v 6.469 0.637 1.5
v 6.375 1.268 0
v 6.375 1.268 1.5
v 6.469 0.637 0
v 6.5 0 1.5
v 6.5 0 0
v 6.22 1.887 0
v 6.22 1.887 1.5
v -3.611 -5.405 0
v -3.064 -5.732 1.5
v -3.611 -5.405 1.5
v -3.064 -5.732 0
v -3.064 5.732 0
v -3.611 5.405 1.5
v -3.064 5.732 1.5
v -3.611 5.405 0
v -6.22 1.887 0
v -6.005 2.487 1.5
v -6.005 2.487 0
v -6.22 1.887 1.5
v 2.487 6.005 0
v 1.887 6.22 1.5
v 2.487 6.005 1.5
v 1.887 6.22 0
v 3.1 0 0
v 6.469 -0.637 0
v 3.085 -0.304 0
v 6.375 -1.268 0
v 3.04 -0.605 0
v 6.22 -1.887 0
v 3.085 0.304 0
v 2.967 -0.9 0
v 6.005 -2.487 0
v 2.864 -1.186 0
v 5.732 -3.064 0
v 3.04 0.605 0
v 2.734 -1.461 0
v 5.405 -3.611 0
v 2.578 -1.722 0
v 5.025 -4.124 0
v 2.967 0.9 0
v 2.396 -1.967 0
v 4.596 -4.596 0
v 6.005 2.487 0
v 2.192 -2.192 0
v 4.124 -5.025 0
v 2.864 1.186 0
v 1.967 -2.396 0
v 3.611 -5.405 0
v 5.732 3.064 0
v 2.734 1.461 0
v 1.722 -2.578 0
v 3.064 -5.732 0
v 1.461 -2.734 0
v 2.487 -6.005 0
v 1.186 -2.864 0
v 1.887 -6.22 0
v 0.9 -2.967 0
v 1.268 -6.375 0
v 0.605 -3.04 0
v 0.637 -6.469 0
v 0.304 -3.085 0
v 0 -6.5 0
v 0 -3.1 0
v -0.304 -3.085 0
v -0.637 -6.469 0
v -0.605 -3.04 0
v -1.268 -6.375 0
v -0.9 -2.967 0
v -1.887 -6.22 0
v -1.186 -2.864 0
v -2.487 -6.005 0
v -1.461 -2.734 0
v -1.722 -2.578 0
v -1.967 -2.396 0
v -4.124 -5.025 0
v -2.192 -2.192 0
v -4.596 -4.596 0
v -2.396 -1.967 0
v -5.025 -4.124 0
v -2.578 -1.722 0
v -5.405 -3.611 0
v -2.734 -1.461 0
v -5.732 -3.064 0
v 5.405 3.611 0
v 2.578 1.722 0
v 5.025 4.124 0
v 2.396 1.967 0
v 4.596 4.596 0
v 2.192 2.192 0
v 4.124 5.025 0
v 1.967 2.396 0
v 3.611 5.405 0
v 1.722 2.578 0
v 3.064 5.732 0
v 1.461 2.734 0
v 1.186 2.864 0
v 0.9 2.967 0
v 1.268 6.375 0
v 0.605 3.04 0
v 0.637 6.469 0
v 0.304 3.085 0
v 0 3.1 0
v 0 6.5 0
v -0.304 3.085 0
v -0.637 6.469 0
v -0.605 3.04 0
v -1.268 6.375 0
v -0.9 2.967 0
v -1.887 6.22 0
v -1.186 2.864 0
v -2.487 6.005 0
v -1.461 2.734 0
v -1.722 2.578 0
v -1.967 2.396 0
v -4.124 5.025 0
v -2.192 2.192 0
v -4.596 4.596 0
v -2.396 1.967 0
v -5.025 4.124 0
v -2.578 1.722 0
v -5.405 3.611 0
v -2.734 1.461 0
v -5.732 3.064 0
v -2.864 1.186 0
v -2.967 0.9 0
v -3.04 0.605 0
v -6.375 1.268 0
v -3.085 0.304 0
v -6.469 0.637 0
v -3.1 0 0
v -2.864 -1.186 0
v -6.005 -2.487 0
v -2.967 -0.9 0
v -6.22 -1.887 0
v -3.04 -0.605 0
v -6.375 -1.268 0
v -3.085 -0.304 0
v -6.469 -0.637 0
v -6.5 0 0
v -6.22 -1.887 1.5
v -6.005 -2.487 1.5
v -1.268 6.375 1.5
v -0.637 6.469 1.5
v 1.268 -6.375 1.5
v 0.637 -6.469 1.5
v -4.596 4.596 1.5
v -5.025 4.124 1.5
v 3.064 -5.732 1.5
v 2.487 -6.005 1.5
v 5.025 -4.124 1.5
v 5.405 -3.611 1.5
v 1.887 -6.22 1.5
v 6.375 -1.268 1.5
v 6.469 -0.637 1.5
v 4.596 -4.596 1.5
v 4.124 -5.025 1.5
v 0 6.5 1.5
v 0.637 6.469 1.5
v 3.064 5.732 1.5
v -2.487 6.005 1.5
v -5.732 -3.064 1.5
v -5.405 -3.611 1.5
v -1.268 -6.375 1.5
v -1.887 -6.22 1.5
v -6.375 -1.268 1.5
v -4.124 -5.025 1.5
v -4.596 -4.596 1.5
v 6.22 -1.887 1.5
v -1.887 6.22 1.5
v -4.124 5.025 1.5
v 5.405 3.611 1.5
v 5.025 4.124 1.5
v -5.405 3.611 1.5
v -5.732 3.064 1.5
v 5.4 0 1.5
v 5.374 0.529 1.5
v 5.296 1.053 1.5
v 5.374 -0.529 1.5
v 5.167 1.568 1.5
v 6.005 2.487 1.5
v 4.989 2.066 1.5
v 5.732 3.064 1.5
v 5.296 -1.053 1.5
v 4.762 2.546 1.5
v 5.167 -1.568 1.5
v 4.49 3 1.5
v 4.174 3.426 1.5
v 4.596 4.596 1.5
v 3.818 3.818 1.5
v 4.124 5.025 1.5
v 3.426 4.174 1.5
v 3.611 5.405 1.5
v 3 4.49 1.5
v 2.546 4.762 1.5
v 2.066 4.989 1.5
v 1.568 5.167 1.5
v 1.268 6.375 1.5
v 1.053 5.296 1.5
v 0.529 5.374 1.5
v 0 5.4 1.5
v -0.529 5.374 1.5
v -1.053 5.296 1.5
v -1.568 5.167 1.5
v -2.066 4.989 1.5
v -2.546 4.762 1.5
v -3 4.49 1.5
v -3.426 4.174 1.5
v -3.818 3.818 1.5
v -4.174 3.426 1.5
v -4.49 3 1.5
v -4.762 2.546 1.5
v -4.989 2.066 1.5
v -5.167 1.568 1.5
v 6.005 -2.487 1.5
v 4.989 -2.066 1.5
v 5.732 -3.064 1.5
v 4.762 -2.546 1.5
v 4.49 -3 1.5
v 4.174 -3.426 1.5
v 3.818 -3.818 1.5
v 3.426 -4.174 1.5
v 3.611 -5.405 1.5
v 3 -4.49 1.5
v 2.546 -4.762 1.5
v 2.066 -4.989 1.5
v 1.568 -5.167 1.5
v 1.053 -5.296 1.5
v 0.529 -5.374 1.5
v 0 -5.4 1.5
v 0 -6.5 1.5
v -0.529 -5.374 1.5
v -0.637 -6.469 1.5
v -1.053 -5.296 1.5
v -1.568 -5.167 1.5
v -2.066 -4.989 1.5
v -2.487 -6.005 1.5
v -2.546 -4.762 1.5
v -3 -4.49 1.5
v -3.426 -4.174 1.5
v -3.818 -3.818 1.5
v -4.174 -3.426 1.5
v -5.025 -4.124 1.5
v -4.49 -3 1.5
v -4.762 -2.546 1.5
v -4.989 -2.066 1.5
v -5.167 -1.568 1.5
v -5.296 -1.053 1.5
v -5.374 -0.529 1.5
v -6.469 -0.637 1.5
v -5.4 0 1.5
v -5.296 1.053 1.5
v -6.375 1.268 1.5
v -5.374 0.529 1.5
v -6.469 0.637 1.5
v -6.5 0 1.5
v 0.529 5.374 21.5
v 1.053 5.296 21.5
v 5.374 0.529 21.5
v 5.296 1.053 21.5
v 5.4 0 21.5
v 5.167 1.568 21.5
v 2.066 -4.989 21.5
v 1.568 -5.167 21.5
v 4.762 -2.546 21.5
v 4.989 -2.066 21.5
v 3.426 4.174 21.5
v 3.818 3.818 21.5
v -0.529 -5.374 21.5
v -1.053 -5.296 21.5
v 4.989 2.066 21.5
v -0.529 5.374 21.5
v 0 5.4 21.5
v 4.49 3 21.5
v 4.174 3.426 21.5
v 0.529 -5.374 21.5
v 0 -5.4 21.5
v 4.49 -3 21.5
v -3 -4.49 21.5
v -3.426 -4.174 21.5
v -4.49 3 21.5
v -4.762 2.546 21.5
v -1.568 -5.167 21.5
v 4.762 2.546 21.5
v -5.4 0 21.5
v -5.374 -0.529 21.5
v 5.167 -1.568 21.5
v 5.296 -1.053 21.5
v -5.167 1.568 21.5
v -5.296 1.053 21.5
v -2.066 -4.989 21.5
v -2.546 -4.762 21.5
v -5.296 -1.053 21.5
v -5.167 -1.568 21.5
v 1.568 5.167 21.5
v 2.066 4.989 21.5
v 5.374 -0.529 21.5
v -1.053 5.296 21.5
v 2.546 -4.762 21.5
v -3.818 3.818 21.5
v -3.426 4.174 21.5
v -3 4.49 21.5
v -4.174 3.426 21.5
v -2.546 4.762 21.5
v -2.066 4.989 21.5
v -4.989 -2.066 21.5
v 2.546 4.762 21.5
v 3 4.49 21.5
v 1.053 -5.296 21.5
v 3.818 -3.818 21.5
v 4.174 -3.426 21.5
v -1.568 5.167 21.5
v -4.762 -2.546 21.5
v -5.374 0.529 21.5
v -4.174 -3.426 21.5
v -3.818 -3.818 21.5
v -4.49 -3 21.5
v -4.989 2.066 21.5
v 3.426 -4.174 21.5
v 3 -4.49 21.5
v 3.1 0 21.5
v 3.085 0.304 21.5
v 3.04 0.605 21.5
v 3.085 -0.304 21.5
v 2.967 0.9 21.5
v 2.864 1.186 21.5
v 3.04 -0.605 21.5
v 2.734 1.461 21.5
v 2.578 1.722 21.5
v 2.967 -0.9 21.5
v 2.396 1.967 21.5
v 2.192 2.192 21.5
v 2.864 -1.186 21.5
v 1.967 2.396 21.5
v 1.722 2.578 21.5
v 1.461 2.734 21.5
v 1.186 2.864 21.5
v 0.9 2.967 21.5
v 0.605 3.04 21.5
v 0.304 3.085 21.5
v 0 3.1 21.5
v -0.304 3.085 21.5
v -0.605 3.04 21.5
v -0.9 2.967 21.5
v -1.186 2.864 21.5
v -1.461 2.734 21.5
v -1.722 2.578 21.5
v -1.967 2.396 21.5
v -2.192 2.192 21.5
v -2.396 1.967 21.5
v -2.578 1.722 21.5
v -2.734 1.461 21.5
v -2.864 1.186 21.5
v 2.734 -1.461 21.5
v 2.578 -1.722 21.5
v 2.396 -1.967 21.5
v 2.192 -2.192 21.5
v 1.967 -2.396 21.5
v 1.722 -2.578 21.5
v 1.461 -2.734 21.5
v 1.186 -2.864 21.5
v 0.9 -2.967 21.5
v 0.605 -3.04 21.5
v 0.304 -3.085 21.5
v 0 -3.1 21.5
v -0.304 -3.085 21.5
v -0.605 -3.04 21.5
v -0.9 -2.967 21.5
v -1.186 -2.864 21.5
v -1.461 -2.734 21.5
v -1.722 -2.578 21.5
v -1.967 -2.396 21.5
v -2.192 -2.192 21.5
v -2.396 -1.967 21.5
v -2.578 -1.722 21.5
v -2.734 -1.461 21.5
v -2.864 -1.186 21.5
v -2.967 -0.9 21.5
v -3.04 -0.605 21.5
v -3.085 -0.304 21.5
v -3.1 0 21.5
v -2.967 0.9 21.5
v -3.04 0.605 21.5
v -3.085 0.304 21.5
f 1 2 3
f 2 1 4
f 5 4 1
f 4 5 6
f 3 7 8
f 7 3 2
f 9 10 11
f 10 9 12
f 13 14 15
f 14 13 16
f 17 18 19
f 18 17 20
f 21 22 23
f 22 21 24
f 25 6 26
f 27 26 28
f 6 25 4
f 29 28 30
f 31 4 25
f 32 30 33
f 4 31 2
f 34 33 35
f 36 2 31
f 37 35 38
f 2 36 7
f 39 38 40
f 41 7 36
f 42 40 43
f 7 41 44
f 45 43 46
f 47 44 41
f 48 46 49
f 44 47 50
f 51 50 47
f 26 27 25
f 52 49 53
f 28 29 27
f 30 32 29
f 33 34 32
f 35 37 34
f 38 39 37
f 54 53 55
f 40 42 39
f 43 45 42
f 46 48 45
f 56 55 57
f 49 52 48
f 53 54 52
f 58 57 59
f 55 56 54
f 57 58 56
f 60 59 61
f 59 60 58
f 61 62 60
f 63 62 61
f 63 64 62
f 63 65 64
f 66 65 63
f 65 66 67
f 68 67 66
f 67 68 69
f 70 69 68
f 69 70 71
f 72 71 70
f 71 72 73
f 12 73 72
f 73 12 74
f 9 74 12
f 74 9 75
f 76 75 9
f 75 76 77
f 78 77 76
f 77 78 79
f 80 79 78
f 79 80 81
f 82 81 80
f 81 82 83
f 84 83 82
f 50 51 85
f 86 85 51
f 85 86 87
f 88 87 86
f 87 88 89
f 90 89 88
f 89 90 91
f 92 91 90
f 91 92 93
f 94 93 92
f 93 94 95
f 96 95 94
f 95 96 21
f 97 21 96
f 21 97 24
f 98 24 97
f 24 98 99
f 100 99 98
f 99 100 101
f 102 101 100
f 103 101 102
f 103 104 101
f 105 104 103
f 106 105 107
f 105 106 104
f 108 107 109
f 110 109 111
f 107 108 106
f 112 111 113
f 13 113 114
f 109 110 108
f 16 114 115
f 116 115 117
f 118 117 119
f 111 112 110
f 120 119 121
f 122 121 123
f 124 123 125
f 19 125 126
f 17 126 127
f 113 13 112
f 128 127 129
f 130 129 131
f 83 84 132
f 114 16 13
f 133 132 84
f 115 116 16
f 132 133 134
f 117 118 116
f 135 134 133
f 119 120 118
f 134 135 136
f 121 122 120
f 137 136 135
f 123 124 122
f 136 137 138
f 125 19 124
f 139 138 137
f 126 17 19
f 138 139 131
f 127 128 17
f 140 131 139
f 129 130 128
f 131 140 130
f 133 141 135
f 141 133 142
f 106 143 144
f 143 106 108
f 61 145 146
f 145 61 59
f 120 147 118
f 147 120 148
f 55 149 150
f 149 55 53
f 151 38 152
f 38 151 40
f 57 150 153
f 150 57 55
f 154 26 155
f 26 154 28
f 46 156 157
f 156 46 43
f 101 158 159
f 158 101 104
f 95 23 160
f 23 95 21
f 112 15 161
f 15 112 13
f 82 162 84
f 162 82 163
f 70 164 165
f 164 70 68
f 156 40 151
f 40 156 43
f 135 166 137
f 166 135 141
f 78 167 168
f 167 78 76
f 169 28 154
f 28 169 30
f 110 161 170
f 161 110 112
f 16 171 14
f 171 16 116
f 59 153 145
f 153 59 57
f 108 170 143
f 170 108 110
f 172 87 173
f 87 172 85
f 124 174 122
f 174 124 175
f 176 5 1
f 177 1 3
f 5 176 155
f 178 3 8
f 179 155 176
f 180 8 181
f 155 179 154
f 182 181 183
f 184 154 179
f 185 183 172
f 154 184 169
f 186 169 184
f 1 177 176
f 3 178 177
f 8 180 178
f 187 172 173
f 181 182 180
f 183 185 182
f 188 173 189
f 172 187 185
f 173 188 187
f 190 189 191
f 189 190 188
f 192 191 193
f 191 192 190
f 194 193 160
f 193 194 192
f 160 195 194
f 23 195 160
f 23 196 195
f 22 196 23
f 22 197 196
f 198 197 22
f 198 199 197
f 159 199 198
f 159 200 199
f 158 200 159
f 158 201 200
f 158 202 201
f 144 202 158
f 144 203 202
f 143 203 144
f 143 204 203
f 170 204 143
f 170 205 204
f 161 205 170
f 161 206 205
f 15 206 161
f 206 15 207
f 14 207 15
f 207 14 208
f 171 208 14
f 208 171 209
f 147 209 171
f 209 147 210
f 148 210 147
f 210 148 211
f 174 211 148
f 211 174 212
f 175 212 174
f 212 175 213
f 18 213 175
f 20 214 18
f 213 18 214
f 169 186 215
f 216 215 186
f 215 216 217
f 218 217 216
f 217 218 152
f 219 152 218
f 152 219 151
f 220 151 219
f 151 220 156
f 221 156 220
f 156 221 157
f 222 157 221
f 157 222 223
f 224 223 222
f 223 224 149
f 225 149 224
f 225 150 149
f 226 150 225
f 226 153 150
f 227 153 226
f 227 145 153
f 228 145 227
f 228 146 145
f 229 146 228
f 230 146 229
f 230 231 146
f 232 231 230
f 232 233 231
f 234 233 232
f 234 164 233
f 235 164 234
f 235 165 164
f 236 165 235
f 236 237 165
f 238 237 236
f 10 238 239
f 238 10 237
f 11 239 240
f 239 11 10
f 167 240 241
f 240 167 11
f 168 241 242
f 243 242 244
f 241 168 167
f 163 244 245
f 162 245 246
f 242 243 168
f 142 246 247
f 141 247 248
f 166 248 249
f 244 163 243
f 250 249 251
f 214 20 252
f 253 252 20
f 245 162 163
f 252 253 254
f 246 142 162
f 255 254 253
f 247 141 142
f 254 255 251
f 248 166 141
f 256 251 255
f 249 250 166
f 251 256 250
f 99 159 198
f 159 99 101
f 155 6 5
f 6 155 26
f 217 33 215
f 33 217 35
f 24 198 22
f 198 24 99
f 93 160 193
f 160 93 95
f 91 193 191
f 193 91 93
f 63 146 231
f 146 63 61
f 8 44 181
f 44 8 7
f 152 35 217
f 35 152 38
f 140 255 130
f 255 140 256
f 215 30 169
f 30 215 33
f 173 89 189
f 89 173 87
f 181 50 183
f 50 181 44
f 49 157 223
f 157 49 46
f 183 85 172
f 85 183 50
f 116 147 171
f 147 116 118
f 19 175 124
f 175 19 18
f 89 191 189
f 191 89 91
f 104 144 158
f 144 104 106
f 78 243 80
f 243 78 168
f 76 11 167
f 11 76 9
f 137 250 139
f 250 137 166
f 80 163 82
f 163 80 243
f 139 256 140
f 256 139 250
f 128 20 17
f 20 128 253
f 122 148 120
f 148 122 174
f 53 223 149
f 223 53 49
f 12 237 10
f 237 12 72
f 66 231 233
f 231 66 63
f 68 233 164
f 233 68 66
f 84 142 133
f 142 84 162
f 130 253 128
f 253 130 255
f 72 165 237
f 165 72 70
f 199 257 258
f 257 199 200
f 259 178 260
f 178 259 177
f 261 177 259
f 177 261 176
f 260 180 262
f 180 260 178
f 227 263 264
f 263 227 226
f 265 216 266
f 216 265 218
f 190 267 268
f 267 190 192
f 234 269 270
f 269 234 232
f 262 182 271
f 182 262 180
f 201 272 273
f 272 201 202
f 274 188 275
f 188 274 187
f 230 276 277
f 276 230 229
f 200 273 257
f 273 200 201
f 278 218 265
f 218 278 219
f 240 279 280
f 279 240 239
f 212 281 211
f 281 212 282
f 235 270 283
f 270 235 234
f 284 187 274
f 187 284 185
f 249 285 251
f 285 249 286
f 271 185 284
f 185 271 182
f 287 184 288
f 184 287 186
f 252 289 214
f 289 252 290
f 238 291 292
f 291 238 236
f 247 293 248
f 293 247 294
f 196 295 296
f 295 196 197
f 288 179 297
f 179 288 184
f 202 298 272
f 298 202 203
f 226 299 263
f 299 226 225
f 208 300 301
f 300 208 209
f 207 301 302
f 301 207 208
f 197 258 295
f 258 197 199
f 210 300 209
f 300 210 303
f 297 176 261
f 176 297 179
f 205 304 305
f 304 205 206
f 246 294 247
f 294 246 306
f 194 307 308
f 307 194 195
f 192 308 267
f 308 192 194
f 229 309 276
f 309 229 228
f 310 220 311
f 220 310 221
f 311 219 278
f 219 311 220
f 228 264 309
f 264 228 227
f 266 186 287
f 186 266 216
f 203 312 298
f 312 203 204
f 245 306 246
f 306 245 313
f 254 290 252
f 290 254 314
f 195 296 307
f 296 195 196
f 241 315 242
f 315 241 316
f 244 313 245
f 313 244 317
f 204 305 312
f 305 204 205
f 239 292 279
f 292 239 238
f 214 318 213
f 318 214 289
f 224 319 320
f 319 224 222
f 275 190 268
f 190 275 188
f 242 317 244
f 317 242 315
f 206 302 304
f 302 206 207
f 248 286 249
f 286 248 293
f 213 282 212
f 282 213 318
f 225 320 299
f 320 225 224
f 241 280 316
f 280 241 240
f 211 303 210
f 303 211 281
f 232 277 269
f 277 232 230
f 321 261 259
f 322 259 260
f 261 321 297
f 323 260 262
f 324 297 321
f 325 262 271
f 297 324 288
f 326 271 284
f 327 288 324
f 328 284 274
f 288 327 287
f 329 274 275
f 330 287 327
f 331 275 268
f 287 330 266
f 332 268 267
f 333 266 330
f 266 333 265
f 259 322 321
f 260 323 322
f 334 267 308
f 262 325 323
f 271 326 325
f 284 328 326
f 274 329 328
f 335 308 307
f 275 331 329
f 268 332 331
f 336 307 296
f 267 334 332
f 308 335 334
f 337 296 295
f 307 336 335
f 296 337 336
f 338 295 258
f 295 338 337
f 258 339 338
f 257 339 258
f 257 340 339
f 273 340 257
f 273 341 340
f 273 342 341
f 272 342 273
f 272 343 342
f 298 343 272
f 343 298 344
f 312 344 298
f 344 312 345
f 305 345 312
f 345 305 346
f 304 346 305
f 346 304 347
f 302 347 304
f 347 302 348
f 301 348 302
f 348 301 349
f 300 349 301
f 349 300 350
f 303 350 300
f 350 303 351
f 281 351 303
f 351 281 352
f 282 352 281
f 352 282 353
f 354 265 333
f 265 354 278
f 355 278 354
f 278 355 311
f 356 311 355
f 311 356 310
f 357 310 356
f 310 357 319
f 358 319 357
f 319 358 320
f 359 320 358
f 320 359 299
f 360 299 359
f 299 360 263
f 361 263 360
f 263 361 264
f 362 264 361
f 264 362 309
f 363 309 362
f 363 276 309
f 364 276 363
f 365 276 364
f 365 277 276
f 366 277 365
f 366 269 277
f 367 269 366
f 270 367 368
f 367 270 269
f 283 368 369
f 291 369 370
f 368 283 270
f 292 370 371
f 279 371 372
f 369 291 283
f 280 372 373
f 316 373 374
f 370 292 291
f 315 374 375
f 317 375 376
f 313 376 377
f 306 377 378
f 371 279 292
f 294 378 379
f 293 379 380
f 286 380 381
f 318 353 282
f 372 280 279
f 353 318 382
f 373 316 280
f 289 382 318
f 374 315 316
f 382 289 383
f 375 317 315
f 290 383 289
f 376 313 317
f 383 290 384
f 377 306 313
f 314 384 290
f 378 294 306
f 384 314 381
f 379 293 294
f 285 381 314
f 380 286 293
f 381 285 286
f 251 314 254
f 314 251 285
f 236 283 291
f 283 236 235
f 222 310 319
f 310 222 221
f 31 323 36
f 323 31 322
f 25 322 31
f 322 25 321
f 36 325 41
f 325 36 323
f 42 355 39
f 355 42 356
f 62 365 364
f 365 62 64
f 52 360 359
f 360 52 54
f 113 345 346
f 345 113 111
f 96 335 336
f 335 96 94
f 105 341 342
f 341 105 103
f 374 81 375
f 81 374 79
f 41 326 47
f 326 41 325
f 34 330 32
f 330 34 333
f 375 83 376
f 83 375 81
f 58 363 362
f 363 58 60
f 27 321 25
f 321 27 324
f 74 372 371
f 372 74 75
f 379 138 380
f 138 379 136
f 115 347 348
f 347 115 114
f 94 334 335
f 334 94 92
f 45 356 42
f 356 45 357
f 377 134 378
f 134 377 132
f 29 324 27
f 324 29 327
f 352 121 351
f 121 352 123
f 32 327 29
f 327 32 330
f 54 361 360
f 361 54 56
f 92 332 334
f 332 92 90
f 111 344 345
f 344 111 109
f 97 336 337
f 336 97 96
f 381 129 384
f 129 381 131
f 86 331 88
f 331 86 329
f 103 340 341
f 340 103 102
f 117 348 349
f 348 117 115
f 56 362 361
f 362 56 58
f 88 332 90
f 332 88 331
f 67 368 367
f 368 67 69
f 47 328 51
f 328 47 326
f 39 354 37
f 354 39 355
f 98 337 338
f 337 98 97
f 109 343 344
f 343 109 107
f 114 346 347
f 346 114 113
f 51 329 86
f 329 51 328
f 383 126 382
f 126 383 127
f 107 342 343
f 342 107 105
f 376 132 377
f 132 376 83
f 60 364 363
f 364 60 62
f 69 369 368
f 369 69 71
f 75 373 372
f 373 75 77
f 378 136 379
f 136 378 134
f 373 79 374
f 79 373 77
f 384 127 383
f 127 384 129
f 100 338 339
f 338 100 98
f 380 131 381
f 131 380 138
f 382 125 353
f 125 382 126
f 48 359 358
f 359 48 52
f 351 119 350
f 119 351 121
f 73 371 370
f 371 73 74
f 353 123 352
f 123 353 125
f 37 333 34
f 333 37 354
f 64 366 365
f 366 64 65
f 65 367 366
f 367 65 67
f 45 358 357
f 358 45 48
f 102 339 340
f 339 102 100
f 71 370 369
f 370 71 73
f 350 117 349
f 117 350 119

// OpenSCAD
// Adapter sleeve: 0.2 mL PCR tube in a 1.5 mL tube rack hole
// Print orientation: collar on the bed (z=0..1.5), sleeve rises to z=21.5

$fn = 64;

// Named dimensions (mm)
collar_diameter = 13.0;    // outer diameter of the bed-side collar
collar_thickness = 1.5;    // collar height (z = 0 to 1.5)
sleeve_outer_diameter = 10.8; // outer diameter of the sleeve body
sleeve_top_z = 21.5;       // top of the sleeve body
bore_diameter = 6.2;       // through-bore diameter, open at both ends
cut_overhang = 0.05;       // cutting shapes extend past faces to avoid coplanar faces

// Derived values
collar_radius = collar_diameter / 2;
sleeve_radius = sleeve_outer_diameter / 2;
bore_radius = bore_diameter / 2;

// Build the solid: collar + sleeve body, then subtract the through-bore
difference() {
    // Base solid: collar + sleeve body
    union() {
        // Collar: flat disc on the bed
        cylinder(h = collar_thickness, d = collar_diameter, center = false);

        // Sleeve body: from top of collar up to z = 21.5
        translate([0, 0, collar_thickness])
            cylinder(h = sleeve_top_z - collar_thickness, d = sleeve_outer_diameter, center = false);
    }

    // Bore: extends 0.05 mm past both open ends
    translate([0, 0, -cut_overhang])
        cylinder(h = sleeve_top_z + 2 * cut_overhang, d = bore_diameter, center = false);
}
